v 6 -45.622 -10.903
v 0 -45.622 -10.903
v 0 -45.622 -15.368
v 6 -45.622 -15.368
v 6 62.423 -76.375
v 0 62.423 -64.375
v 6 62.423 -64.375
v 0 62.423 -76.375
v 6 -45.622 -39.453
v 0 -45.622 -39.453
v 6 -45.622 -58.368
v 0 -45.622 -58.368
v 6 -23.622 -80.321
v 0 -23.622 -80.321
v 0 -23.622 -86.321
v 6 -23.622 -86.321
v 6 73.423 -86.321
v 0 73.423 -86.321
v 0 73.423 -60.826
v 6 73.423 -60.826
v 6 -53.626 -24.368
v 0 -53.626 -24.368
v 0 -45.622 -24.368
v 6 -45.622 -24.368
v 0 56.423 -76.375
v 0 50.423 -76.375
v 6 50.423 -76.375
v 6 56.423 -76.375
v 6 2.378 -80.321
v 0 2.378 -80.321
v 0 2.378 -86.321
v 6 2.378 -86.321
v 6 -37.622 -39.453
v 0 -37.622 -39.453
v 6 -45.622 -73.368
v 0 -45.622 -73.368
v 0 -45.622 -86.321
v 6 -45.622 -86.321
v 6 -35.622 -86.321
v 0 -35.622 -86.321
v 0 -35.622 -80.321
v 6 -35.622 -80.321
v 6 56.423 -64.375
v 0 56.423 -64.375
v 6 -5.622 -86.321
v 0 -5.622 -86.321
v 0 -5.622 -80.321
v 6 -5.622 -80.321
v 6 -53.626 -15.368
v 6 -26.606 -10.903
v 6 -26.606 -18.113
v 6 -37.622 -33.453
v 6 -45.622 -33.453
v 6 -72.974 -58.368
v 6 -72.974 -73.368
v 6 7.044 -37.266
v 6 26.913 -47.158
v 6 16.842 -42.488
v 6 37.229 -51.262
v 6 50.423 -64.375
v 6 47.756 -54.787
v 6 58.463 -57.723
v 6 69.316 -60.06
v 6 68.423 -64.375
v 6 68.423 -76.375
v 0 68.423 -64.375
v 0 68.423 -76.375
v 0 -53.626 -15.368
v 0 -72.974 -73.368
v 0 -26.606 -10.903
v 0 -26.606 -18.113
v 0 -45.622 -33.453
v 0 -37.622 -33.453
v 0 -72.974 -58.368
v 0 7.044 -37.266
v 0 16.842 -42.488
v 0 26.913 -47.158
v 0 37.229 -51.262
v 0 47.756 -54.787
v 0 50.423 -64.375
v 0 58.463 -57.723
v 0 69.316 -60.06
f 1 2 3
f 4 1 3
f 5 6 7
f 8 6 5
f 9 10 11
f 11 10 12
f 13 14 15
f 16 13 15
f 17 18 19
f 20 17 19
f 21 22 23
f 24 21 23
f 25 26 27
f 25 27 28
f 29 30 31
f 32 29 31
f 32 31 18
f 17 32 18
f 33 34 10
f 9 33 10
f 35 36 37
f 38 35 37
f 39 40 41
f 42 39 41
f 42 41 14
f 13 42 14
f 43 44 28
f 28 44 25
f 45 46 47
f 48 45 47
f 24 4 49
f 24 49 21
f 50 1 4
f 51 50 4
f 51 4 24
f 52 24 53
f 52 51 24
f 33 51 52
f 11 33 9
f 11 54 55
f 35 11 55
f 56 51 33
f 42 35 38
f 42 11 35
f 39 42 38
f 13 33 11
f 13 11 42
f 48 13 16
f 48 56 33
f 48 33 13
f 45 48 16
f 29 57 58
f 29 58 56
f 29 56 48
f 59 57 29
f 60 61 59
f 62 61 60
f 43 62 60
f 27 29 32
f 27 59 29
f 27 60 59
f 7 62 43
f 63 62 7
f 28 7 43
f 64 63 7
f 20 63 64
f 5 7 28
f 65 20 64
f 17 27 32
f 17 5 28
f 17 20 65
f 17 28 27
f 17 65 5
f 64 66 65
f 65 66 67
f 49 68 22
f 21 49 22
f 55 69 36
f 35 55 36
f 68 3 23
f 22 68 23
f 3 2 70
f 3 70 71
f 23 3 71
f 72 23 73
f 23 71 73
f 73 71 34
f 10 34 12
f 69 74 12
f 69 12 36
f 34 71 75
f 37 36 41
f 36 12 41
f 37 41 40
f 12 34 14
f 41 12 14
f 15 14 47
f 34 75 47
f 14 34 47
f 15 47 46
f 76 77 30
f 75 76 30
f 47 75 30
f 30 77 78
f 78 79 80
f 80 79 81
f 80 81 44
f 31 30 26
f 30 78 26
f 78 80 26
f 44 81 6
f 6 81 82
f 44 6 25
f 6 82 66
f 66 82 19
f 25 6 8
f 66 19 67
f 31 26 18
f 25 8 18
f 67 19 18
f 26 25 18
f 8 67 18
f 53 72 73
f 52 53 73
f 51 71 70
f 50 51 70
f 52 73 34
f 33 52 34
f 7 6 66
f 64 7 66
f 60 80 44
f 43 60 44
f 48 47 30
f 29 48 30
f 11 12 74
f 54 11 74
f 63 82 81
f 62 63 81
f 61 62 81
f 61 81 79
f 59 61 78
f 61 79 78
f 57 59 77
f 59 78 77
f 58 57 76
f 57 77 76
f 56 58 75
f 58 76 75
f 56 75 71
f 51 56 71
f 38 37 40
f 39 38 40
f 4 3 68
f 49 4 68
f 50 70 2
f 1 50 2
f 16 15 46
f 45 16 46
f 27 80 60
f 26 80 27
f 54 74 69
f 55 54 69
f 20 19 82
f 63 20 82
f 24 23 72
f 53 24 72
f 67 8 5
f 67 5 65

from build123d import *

# Parameters (mm, degrees)
SKETCH1_W           = 12
SKETCH1_H           = 6
BOSS_EXTRUDE1_DEPTH = 6


with BuildPart() as part:
    # Sketch1 → Boss-Extrude1 (new body)
    with BuildSketch(Plane(origin=(0, 0, 0), x_dir=(0, 0, -1), z_dir=(1, 0, 0))):
        with BuildLine():
            Line((86.321496787, 73.422774132), (60.826091075, 73.422774132))
            Line((60.826091075, 73.422774132), (60.060334343, 69.316135154))
            ThreePointArc((60.060334343, 69.316135154), (51.261909479, 37.228978051), (37.265778766, 7.044441347))
            Line((37.265778766, 7.044441347), (18.112573434, -26.605921739))
            Line((18.112573434, -26.605921739), (10.903253971, -26.605921739))
            Line((10.903253971, -26.605921739), (10.903253971, -45.622400338))
            Line((10.903253971, -45.622400338), (15.367545377, -45.622400338))
            Line((15.367545377, -45.622400338), (15.367545377, -53.626330222))
            Line((15.367545377, -53.626330222), (24.367545377, -53.626330222))
            Line((24.367545377, -53.626330222), (24.367545377, -45.622400338))
            Line((24.367545377, -45.622400338), (33.453304177, -45.622400338))
            Line((33.453304177, -45.622400338), (33.453304177, -37.622400338))
            Line((33.453304177, -37.622400338), (39.453304177, -37.622400338))
            Line((39.453304177, -37.622400338), (39.453304177, -45.622400338))
            Line((39.453304177, -45.622400338), (58.367545377, -45.622400338))
            Line((58.367545377, -45.622400338), (58.367545377, -72.9735186))
            Line((58.367545377, -72.9735186), (73.367545377, -72.9735186))
            Line((73.367545377, -72.9735186), (73.367545377, -45.622400338))
            Line((73.367545377, -45.622400338), (86.321496787, -45.622400338))
            Line((86.321496787, -45.622400338), (86.321496787, -35.622400338))
            Line((86.321496787, -35.622400338), (80.321496787, -35.622400338))
            Line((80.321496787, -35.622400338), (80.321496787, -23.622400338))
            Line((80.321496787, -23.622400338), (86.321496787, -23.622400338))
            Line((86.321496787, -23.622400338), (86.321496787, -5.622400338))
            Line((86.321496787, -5.622400338), (80.321496787, -5.622400338))
            Line((80.321496787, -5.622400338), (80.321496787, 2.377599662))
            Line((80.321496787, 2.377599662), (86.321496787, 2.377599662))
            Line((86.321496787, 2.377599662), (86.321496787, 73.422774132))
        make_face()
        with Locations((70.374836387, 65.422774132)):
            Rectangle(SKETCH1_W, SKETCH1_H, mode=Mode.SUBTRACT)
        with Locations((70.374836387, 53.422774132)):
            Rectangle(SKETCH1_W, SKETCH1_H, mode=Mode.SUBTRACT)
    extrude(amount=BOSS_EXTRUDE1_DEPTH)


solid = part.part
